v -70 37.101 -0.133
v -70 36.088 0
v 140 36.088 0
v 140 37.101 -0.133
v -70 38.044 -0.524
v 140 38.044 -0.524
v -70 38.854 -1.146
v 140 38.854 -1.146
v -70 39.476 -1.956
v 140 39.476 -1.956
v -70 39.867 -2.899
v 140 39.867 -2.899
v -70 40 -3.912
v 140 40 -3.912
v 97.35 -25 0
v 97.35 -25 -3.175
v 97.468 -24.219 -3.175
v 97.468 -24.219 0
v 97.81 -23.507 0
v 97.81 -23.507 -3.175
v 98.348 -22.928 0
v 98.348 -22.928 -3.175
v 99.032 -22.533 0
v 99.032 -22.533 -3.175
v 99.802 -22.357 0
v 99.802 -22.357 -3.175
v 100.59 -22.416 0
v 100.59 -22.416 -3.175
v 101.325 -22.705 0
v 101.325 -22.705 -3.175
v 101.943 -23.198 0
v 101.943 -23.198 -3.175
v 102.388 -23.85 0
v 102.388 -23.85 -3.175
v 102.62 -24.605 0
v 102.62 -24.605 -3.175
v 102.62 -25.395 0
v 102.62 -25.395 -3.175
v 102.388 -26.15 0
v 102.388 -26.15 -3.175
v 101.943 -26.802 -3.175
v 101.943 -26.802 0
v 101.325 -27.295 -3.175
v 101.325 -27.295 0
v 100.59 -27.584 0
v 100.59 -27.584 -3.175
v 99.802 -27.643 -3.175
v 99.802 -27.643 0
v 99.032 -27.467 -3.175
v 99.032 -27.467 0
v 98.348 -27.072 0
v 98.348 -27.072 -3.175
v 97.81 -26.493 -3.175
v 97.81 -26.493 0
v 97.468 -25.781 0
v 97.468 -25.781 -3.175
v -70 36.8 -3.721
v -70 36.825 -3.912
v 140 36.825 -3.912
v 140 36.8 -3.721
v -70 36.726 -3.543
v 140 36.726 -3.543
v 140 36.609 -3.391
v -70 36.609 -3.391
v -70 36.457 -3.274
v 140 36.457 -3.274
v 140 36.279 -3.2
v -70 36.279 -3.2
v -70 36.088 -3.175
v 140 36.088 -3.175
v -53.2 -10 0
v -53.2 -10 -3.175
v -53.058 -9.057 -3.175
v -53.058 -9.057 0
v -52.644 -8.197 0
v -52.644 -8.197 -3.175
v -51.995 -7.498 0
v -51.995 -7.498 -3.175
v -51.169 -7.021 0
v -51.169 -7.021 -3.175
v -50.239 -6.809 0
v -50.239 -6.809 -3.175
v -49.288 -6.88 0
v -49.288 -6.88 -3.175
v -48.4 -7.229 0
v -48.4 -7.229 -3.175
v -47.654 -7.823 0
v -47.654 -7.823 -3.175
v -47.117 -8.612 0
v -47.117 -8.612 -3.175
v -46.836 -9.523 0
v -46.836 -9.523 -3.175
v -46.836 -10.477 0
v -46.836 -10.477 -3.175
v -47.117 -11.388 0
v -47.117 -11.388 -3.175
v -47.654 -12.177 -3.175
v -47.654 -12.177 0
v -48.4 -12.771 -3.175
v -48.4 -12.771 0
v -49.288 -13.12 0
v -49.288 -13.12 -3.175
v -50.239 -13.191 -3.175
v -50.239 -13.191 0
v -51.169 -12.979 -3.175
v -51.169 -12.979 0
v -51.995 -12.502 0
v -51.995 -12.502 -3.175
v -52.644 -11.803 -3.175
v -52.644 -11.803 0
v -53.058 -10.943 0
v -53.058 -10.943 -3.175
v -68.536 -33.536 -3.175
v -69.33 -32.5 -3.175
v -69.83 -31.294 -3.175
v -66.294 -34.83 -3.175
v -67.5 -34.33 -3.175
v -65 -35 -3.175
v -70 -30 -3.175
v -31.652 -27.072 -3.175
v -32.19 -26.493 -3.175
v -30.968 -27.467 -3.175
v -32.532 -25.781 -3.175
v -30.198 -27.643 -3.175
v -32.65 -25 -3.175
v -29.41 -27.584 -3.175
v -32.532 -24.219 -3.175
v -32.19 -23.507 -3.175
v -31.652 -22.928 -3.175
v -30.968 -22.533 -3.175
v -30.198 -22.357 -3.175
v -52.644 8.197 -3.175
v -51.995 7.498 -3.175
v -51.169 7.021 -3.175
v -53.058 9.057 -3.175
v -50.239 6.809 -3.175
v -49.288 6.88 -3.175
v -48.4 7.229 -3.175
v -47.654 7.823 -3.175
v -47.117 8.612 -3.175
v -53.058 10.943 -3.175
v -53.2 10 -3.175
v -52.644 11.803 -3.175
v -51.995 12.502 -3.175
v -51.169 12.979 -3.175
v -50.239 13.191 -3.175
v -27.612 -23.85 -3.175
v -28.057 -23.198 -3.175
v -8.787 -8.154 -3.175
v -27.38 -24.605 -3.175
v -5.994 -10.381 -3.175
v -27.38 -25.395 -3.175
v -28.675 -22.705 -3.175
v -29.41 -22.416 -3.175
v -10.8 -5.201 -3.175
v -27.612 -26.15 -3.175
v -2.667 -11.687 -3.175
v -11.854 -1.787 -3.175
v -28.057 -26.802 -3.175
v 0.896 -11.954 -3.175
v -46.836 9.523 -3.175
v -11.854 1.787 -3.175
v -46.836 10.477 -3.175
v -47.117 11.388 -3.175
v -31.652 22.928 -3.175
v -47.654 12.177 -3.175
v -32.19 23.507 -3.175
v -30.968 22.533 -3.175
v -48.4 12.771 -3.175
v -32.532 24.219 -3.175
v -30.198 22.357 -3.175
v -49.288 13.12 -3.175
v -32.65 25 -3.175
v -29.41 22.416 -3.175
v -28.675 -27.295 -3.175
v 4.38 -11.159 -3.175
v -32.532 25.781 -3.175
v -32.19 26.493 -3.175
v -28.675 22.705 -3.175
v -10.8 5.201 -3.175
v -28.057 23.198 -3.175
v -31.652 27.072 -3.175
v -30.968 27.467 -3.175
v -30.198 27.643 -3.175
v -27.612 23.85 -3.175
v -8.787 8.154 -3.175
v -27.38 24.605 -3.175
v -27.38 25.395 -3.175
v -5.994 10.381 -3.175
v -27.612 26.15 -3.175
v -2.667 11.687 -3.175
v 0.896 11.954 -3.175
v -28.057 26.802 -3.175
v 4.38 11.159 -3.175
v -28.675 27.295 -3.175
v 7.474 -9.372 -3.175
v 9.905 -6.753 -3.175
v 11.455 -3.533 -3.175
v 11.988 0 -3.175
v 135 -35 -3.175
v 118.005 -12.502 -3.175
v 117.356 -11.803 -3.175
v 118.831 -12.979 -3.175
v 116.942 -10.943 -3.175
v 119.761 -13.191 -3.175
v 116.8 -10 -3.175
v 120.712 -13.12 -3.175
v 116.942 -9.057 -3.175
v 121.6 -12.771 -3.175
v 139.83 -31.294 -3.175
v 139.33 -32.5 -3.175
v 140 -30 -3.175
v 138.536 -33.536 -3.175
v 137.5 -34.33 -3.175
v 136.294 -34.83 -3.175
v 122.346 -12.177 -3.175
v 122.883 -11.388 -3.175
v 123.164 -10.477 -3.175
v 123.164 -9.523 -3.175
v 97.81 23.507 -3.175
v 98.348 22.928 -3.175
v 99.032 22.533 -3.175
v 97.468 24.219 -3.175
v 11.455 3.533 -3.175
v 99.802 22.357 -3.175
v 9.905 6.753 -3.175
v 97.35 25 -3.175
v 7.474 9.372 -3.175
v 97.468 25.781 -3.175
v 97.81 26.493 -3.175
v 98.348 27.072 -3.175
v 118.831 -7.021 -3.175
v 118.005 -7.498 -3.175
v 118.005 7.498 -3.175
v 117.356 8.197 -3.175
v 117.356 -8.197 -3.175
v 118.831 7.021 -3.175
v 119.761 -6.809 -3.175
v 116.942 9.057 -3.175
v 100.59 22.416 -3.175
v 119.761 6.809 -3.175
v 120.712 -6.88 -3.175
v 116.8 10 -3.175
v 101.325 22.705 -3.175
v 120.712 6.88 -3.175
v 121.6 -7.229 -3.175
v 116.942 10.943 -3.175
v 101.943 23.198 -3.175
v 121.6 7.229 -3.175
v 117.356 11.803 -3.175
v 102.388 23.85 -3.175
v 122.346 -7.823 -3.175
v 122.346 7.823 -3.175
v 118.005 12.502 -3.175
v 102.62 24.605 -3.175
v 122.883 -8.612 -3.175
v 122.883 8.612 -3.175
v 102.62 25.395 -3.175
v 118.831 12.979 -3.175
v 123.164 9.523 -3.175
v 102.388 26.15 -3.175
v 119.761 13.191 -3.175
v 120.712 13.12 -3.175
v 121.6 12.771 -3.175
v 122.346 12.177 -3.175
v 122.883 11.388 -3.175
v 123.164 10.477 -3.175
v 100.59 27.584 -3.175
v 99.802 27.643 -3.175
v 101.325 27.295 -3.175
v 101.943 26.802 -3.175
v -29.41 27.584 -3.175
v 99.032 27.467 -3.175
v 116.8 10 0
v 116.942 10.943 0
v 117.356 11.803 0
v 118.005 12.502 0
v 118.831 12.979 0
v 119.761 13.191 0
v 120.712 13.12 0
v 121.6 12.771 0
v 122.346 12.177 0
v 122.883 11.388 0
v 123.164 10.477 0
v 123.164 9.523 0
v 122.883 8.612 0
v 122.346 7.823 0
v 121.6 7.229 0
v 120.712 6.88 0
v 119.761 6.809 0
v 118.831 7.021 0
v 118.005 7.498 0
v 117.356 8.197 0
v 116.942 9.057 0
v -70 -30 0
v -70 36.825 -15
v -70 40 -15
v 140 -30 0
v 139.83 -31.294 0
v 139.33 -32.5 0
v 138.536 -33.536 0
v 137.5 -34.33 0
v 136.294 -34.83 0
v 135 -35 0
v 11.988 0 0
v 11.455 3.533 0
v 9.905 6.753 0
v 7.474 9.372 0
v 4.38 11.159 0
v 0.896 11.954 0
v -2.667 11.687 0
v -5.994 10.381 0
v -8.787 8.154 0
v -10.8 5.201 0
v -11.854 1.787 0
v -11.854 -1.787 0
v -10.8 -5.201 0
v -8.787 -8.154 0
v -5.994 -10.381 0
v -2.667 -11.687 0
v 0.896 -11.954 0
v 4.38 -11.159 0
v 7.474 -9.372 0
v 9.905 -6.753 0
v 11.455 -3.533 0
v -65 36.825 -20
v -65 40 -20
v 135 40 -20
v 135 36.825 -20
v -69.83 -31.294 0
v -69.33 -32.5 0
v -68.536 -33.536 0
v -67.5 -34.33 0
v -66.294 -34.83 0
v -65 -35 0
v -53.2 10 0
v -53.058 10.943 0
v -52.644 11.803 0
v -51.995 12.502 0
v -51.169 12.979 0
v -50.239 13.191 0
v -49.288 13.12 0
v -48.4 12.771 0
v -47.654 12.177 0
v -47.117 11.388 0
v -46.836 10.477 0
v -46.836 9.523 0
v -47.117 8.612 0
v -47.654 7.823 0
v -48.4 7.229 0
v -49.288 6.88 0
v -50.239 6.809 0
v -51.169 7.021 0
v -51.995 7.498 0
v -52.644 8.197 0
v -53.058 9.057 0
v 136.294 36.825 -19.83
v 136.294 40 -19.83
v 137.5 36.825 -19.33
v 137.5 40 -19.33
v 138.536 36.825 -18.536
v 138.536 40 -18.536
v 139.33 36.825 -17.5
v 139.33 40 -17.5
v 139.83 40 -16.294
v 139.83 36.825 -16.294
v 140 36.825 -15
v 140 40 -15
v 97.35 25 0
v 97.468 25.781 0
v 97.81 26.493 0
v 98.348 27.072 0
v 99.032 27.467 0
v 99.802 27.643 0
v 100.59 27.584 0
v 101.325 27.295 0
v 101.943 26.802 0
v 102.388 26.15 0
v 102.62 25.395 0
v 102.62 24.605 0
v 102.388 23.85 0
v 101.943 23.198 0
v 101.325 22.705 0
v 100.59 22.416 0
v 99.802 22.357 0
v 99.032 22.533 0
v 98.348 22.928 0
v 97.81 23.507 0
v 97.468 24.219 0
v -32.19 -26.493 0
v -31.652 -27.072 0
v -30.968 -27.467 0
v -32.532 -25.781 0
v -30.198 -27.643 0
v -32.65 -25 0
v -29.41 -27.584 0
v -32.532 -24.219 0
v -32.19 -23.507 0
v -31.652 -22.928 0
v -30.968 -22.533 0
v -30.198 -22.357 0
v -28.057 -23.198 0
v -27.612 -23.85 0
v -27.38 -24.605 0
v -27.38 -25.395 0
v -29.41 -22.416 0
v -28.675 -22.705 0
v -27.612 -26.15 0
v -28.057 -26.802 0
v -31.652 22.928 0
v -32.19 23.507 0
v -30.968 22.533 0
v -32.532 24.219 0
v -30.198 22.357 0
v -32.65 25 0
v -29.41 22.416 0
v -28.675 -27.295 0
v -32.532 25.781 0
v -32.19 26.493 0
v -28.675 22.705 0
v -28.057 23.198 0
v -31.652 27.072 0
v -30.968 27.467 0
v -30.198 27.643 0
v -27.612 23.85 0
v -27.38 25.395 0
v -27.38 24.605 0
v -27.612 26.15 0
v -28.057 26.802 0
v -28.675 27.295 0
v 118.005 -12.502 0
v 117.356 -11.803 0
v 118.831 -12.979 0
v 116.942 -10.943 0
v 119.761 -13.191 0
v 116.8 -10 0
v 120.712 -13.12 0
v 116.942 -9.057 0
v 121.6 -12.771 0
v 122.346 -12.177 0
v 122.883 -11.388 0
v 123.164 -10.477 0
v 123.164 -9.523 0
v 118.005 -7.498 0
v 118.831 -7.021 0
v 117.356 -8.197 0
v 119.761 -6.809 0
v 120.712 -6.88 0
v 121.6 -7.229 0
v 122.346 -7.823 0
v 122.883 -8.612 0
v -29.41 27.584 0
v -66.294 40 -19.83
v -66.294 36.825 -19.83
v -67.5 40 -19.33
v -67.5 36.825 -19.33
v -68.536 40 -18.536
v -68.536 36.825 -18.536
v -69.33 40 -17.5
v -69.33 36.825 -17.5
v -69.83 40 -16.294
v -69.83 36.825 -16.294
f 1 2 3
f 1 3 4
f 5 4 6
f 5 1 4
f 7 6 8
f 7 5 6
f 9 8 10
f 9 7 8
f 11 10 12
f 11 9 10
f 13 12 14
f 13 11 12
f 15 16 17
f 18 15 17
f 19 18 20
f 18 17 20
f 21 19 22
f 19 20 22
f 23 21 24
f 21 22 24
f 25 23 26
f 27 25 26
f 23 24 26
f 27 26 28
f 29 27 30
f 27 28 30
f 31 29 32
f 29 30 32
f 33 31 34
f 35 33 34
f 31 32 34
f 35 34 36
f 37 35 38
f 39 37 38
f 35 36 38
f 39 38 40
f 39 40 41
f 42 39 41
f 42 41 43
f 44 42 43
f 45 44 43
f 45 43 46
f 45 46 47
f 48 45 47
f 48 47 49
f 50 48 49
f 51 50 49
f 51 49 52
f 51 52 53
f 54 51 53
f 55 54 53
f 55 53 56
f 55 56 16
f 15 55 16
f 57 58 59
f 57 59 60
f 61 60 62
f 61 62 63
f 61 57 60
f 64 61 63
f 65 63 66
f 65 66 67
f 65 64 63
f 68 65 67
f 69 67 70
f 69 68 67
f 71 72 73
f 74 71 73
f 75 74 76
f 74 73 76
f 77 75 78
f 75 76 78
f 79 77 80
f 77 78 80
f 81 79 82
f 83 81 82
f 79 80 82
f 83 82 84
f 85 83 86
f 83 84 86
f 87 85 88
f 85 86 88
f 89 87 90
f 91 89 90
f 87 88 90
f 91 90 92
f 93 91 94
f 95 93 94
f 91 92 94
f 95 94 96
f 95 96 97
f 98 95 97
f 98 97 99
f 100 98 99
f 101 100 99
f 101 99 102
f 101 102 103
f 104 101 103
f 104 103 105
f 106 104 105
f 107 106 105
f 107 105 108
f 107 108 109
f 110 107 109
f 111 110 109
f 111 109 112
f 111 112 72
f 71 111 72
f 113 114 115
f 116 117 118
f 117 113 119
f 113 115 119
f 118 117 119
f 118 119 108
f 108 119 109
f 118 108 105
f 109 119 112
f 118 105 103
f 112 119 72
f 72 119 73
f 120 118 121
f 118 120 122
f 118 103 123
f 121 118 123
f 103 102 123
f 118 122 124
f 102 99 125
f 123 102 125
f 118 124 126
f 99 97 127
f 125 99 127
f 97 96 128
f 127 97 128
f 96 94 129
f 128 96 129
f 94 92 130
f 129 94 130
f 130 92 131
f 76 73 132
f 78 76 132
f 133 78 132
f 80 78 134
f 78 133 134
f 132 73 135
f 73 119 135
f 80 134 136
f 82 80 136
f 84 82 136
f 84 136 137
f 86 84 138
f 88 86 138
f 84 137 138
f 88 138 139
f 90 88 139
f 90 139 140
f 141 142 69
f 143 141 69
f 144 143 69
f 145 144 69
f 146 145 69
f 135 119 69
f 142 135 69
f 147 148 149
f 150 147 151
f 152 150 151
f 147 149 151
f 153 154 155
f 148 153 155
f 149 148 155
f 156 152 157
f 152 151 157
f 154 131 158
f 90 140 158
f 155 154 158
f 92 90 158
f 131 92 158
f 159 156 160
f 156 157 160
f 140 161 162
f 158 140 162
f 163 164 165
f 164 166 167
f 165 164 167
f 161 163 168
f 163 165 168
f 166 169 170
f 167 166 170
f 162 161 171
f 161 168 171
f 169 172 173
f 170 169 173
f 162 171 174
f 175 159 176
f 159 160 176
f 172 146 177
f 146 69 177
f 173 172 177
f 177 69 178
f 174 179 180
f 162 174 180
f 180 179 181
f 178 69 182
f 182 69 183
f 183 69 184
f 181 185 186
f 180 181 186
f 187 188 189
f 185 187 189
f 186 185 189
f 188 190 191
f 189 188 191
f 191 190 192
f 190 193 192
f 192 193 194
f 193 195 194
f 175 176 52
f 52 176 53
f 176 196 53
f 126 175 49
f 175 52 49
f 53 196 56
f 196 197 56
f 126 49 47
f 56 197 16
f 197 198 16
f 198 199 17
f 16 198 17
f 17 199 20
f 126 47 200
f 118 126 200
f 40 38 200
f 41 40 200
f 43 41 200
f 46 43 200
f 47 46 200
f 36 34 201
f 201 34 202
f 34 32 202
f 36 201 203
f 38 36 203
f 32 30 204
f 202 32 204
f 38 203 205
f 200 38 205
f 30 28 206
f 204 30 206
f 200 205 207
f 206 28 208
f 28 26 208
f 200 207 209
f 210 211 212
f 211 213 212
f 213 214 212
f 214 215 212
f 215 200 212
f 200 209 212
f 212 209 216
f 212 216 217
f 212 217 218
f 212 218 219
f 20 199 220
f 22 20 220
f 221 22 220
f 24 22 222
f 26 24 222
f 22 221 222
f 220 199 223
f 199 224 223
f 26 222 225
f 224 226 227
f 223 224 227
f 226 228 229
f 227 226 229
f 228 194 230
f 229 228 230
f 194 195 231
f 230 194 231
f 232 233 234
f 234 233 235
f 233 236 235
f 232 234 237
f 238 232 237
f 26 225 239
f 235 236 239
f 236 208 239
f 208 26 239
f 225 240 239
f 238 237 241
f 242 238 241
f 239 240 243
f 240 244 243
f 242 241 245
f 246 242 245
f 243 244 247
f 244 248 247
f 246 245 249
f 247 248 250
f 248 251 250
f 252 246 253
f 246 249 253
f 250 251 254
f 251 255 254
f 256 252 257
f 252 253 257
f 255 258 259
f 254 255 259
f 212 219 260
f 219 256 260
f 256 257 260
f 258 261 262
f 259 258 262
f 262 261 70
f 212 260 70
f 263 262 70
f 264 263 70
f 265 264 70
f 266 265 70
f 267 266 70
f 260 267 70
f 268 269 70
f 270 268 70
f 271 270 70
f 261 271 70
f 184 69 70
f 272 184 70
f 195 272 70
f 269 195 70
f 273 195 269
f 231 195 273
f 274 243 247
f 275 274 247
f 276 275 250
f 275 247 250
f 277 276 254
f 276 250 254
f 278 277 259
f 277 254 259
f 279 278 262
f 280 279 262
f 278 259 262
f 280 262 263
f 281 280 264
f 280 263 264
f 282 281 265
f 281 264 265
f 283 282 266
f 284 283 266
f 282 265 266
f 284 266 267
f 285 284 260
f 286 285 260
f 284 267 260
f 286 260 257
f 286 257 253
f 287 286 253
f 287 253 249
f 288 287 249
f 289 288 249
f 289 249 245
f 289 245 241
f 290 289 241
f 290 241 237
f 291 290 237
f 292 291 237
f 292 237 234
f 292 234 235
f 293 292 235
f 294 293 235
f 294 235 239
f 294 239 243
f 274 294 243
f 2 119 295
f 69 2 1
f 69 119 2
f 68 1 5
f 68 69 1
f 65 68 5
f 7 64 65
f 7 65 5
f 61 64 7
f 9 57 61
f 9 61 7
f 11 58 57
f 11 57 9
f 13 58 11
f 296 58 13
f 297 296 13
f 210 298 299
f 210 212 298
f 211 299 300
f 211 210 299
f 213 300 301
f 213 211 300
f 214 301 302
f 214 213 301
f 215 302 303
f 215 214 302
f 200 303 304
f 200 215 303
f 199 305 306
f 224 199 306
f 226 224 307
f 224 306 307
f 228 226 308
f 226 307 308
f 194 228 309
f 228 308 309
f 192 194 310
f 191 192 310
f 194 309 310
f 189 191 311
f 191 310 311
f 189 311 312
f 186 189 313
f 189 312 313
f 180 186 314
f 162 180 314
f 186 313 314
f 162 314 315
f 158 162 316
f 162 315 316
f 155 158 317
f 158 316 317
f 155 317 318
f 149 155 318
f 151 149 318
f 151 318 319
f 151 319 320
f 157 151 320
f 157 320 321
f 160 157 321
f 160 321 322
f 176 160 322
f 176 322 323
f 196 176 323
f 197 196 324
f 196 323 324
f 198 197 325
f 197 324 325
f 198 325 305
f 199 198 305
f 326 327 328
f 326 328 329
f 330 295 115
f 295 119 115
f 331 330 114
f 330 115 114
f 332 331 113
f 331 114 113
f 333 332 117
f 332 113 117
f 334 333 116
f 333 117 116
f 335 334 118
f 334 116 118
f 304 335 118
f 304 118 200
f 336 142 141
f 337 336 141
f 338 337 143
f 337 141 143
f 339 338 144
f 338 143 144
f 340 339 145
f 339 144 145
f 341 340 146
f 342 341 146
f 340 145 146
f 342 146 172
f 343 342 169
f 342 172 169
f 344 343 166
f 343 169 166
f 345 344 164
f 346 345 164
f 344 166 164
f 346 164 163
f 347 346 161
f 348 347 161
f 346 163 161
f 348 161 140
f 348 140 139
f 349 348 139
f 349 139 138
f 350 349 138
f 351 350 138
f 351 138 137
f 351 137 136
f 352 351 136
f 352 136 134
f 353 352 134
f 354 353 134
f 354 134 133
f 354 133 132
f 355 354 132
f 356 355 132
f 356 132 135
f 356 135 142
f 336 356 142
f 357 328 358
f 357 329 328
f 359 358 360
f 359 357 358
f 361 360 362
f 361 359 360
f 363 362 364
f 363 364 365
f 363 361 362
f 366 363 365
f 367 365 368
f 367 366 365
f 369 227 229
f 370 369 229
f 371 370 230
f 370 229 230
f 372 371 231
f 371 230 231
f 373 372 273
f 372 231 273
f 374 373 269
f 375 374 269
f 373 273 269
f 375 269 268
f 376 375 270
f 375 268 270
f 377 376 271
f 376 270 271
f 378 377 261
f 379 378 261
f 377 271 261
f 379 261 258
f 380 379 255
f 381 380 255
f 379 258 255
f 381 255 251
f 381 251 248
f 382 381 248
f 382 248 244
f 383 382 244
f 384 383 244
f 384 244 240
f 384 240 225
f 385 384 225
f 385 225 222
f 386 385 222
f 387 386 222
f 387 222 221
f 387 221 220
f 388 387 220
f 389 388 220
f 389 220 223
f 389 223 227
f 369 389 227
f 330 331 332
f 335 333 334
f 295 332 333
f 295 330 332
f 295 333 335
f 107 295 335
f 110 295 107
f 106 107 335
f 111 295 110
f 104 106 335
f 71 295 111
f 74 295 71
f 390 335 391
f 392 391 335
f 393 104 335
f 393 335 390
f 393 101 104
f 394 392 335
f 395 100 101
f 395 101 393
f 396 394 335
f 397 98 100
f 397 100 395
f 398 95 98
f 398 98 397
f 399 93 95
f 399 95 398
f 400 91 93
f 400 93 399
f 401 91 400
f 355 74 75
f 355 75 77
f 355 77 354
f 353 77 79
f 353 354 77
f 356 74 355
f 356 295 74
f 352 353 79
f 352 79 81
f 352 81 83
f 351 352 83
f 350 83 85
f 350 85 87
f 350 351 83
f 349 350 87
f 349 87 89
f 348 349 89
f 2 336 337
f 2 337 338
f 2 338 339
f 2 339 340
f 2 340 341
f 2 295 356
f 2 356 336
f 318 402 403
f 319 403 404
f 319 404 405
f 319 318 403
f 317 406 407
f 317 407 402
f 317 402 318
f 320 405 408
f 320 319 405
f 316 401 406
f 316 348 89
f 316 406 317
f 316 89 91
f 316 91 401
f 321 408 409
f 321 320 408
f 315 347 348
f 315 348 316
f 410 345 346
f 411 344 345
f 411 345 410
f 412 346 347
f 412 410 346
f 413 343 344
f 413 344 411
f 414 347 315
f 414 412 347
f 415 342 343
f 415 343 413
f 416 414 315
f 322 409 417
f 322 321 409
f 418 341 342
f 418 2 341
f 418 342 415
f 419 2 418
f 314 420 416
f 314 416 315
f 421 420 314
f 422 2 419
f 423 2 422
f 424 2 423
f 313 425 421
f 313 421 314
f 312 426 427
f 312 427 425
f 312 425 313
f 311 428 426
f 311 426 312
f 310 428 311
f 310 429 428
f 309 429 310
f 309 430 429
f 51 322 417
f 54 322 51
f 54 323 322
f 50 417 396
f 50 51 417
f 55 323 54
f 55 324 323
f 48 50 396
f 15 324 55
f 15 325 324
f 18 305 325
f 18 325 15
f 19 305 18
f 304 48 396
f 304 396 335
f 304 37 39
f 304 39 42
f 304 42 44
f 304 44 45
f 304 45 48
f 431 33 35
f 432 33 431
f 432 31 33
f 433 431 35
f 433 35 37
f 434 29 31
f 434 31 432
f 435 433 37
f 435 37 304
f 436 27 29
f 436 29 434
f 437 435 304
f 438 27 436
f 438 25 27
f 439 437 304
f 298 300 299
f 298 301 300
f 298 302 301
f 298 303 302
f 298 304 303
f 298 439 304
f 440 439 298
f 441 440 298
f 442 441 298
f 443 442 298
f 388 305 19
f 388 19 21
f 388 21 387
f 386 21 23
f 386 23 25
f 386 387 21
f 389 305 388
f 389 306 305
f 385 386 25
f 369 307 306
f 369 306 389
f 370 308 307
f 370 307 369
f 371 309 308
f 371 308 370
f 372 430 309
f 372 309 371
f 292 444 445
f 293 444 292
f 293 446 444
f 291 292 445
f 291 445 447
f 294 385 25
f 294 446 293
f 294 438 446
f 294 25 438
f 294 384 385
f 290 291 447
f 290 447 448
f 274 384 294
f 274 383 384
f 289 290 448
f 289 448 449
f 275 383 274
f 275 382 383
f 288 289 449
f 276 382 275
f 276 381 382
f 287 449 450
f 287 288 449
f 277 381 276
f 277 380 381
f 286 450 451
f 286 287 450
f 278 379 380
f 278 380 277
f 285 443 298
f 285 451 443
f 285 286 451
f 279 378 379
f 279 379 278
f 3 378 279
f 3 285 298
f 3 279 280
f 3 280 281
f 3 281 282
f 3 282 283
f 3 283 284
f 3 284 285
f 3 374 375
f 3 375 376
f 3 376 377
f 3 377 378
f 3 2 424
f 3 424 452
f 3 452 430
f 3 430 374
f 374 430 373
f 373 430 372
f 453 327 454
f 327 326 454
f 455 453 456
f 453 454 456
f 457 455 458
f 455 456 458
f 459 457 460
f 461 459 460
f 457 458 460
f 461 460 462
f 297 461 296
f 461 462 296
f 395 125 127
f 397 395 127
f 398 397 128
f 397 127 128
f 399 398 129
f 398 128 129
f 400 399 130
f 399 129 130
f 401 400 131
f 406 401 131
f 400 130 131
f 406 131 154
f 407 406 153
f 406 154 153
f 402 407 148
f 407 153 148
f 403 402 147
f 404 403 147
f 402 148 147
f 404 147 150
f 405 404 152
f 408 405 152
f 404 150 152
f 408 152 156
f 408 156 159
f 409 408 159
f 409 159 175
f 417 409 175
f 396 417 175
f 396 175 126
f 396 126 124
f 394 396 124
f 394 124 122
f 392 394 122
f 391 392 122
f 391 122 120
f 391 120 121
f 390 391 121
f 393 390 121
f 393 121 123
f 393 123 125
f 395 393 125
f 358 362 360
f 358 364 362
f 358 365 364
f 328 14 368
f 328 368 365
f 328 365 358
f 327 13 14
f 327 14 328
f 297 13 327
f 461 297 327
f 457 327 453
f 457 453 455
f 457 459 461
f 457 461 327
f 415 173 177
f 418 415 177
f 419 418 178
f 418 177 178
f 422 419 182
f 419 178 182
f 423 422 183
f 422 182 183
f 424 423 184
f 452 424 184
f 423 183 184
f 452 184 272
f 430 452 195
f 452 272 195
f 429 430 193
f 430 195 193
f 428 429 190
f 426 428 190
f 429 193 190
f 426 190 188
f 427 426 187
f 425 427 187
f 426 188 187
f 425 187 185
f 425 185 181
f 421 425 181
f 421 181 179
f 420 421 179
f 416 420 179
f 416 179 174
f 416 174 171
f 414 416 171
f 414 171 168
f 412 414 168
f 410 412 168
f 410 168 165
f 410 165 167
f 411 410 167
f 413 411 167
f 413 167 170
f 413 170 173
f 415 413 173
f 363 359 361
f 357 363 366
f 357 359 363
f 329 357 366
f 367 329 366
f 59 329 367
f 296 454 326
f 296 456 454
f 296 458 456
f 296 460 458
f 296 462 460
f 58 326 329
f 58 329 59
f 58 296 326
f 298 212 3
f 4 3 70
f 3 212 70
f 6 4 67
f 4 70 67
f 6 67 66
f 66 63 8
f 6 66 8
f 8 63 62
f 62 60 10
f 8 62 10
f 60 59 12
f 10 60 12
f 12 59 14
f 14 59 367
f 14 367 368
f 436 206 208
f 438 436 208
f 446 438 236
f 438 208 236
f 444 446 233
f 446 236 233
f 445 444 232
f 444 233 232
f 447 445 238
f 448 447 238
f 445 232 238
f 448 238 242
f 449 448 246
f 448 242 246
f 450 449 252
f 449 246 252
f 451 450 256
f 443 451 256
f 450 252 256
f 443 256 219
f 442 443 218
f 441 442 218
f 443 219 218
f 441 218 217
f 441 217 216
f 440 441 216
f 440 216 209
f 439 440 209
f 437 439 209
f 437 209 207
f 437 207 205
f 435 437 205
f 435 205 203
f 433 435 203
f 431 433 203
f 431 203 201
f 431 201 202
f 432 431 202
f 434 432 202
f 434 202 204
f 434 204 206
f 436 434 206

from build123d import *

# Parameters (mm, degrees)
SKETCH1_W                    = 210
SKETCH1_H                    = 75
SKETCH1_R                    = 11.9875
BASE_FLANGE1_DEPTH           = 3.175
EDGE_FLANGE1_STRIP_W         = 14.1732
EDGE_FLANGE1_STRIP_H         = 3.175
EDGE_FLANGE1_STRIP_CUT_DEPTH = 210
EDGE_FLANGE1_DEPTH           = 210
M6_CLEARANCE_HOLE2_D         = 6.4
M5_CLEARANCE_HOLE1_D         = 5.3
FILLET1_R                    = 5


# Sheet-metal steps are written as plain solids
with BuildPart() as part:
    # Sketch1 → Base-Flange1 (new body)
    with BuildSketch(Plane.XY):
        with Locations((35, 2.5)):
            Rectangle(SKETCH1_W, SKETCH1_H)
        Circle(SKETCH1_R, mode=Mode.SUBTRACT)
    extrude(amount=-BASE_FLANGE1_DEPTH)

    # Edge-Flange1 strip (across the edge) → Edge-Flange1 strip cut (cut)
    with BuildSketch(Plane(origin=(-70, 40, -3.175), x_dir=(0, -1, 0), z_dir=(1, 0, 0))):
        with Locations((-3.175, -1.5875)):
            Rectangle(EDGE_FLANGE1_STRIP_W, EDGE_FLANGE1_STRIP_H)
    extrude(amount=EDGE_FLANGE1_STRIP_CUT_DEPTH, mode=Mode.SUBTRACT)

    # Edge-Flange1 section (across the edge) → Edge-Flange1 (add)
    with BuildSketch(Plane(origin=(-70, 40, -3.175), x_dir=(0, -1, 0), z_dir=(1, 0, 0))):
        with BuildLine():
            Line((0, 0.7366), (0, 16.825))
            Line((0, 16.825), (3.175, 16.825))
            Line((3.175, 16.825), (3.175, 0.7366))
            ThreePointArc((3.175, 0.7366), (3.390745145, 0.215745145), (3.9116, 0))
            Line((3.9116, 0), (3.9116, -3.175))
            ThreePointArc((3.9116, -3.175), (1.145681115, -2.029318885), (0, 0.7366))
        make_face()
    extrude(amount=EDGE_FLANGE1_DEPTH)

    # M6 Clearance Hole2 (through all)
    with Locations(Plane(origin=(-50, 10, 0), x_dir=(1, 0, 0), z_dir=(0, 0, 1))):
        with Locations((0, 0), (0, -20), (170, -20), (170, 0)):
            Hole(M6_CLEARANCE_HOLE2_D / 2)

    # M5 Clearance Hole1 (through all)
    with Locations(Plane(origin=(-30, 25, 0), x_dir=(1, 0, 0), z_dir=(0, 0, 1))):
        with Locations((0, 0), (0, -50), (130, -50), (130, 0)):
            Hole(M5_CLEARANCE_HOLE1_D / 2)

    # Fillet1
    fillet1_edges = [part.edges().sort_by_distance(p)[0] for p in [
        (-70, 38.4125, -20),
        (140, 38.4125, -20),
        (140, -35, -1.5875),
        (-70, -35, -1.5875),
    ]]
    fillet(fillet1_edges, radius=FILLET1_R)


solid = part.part
